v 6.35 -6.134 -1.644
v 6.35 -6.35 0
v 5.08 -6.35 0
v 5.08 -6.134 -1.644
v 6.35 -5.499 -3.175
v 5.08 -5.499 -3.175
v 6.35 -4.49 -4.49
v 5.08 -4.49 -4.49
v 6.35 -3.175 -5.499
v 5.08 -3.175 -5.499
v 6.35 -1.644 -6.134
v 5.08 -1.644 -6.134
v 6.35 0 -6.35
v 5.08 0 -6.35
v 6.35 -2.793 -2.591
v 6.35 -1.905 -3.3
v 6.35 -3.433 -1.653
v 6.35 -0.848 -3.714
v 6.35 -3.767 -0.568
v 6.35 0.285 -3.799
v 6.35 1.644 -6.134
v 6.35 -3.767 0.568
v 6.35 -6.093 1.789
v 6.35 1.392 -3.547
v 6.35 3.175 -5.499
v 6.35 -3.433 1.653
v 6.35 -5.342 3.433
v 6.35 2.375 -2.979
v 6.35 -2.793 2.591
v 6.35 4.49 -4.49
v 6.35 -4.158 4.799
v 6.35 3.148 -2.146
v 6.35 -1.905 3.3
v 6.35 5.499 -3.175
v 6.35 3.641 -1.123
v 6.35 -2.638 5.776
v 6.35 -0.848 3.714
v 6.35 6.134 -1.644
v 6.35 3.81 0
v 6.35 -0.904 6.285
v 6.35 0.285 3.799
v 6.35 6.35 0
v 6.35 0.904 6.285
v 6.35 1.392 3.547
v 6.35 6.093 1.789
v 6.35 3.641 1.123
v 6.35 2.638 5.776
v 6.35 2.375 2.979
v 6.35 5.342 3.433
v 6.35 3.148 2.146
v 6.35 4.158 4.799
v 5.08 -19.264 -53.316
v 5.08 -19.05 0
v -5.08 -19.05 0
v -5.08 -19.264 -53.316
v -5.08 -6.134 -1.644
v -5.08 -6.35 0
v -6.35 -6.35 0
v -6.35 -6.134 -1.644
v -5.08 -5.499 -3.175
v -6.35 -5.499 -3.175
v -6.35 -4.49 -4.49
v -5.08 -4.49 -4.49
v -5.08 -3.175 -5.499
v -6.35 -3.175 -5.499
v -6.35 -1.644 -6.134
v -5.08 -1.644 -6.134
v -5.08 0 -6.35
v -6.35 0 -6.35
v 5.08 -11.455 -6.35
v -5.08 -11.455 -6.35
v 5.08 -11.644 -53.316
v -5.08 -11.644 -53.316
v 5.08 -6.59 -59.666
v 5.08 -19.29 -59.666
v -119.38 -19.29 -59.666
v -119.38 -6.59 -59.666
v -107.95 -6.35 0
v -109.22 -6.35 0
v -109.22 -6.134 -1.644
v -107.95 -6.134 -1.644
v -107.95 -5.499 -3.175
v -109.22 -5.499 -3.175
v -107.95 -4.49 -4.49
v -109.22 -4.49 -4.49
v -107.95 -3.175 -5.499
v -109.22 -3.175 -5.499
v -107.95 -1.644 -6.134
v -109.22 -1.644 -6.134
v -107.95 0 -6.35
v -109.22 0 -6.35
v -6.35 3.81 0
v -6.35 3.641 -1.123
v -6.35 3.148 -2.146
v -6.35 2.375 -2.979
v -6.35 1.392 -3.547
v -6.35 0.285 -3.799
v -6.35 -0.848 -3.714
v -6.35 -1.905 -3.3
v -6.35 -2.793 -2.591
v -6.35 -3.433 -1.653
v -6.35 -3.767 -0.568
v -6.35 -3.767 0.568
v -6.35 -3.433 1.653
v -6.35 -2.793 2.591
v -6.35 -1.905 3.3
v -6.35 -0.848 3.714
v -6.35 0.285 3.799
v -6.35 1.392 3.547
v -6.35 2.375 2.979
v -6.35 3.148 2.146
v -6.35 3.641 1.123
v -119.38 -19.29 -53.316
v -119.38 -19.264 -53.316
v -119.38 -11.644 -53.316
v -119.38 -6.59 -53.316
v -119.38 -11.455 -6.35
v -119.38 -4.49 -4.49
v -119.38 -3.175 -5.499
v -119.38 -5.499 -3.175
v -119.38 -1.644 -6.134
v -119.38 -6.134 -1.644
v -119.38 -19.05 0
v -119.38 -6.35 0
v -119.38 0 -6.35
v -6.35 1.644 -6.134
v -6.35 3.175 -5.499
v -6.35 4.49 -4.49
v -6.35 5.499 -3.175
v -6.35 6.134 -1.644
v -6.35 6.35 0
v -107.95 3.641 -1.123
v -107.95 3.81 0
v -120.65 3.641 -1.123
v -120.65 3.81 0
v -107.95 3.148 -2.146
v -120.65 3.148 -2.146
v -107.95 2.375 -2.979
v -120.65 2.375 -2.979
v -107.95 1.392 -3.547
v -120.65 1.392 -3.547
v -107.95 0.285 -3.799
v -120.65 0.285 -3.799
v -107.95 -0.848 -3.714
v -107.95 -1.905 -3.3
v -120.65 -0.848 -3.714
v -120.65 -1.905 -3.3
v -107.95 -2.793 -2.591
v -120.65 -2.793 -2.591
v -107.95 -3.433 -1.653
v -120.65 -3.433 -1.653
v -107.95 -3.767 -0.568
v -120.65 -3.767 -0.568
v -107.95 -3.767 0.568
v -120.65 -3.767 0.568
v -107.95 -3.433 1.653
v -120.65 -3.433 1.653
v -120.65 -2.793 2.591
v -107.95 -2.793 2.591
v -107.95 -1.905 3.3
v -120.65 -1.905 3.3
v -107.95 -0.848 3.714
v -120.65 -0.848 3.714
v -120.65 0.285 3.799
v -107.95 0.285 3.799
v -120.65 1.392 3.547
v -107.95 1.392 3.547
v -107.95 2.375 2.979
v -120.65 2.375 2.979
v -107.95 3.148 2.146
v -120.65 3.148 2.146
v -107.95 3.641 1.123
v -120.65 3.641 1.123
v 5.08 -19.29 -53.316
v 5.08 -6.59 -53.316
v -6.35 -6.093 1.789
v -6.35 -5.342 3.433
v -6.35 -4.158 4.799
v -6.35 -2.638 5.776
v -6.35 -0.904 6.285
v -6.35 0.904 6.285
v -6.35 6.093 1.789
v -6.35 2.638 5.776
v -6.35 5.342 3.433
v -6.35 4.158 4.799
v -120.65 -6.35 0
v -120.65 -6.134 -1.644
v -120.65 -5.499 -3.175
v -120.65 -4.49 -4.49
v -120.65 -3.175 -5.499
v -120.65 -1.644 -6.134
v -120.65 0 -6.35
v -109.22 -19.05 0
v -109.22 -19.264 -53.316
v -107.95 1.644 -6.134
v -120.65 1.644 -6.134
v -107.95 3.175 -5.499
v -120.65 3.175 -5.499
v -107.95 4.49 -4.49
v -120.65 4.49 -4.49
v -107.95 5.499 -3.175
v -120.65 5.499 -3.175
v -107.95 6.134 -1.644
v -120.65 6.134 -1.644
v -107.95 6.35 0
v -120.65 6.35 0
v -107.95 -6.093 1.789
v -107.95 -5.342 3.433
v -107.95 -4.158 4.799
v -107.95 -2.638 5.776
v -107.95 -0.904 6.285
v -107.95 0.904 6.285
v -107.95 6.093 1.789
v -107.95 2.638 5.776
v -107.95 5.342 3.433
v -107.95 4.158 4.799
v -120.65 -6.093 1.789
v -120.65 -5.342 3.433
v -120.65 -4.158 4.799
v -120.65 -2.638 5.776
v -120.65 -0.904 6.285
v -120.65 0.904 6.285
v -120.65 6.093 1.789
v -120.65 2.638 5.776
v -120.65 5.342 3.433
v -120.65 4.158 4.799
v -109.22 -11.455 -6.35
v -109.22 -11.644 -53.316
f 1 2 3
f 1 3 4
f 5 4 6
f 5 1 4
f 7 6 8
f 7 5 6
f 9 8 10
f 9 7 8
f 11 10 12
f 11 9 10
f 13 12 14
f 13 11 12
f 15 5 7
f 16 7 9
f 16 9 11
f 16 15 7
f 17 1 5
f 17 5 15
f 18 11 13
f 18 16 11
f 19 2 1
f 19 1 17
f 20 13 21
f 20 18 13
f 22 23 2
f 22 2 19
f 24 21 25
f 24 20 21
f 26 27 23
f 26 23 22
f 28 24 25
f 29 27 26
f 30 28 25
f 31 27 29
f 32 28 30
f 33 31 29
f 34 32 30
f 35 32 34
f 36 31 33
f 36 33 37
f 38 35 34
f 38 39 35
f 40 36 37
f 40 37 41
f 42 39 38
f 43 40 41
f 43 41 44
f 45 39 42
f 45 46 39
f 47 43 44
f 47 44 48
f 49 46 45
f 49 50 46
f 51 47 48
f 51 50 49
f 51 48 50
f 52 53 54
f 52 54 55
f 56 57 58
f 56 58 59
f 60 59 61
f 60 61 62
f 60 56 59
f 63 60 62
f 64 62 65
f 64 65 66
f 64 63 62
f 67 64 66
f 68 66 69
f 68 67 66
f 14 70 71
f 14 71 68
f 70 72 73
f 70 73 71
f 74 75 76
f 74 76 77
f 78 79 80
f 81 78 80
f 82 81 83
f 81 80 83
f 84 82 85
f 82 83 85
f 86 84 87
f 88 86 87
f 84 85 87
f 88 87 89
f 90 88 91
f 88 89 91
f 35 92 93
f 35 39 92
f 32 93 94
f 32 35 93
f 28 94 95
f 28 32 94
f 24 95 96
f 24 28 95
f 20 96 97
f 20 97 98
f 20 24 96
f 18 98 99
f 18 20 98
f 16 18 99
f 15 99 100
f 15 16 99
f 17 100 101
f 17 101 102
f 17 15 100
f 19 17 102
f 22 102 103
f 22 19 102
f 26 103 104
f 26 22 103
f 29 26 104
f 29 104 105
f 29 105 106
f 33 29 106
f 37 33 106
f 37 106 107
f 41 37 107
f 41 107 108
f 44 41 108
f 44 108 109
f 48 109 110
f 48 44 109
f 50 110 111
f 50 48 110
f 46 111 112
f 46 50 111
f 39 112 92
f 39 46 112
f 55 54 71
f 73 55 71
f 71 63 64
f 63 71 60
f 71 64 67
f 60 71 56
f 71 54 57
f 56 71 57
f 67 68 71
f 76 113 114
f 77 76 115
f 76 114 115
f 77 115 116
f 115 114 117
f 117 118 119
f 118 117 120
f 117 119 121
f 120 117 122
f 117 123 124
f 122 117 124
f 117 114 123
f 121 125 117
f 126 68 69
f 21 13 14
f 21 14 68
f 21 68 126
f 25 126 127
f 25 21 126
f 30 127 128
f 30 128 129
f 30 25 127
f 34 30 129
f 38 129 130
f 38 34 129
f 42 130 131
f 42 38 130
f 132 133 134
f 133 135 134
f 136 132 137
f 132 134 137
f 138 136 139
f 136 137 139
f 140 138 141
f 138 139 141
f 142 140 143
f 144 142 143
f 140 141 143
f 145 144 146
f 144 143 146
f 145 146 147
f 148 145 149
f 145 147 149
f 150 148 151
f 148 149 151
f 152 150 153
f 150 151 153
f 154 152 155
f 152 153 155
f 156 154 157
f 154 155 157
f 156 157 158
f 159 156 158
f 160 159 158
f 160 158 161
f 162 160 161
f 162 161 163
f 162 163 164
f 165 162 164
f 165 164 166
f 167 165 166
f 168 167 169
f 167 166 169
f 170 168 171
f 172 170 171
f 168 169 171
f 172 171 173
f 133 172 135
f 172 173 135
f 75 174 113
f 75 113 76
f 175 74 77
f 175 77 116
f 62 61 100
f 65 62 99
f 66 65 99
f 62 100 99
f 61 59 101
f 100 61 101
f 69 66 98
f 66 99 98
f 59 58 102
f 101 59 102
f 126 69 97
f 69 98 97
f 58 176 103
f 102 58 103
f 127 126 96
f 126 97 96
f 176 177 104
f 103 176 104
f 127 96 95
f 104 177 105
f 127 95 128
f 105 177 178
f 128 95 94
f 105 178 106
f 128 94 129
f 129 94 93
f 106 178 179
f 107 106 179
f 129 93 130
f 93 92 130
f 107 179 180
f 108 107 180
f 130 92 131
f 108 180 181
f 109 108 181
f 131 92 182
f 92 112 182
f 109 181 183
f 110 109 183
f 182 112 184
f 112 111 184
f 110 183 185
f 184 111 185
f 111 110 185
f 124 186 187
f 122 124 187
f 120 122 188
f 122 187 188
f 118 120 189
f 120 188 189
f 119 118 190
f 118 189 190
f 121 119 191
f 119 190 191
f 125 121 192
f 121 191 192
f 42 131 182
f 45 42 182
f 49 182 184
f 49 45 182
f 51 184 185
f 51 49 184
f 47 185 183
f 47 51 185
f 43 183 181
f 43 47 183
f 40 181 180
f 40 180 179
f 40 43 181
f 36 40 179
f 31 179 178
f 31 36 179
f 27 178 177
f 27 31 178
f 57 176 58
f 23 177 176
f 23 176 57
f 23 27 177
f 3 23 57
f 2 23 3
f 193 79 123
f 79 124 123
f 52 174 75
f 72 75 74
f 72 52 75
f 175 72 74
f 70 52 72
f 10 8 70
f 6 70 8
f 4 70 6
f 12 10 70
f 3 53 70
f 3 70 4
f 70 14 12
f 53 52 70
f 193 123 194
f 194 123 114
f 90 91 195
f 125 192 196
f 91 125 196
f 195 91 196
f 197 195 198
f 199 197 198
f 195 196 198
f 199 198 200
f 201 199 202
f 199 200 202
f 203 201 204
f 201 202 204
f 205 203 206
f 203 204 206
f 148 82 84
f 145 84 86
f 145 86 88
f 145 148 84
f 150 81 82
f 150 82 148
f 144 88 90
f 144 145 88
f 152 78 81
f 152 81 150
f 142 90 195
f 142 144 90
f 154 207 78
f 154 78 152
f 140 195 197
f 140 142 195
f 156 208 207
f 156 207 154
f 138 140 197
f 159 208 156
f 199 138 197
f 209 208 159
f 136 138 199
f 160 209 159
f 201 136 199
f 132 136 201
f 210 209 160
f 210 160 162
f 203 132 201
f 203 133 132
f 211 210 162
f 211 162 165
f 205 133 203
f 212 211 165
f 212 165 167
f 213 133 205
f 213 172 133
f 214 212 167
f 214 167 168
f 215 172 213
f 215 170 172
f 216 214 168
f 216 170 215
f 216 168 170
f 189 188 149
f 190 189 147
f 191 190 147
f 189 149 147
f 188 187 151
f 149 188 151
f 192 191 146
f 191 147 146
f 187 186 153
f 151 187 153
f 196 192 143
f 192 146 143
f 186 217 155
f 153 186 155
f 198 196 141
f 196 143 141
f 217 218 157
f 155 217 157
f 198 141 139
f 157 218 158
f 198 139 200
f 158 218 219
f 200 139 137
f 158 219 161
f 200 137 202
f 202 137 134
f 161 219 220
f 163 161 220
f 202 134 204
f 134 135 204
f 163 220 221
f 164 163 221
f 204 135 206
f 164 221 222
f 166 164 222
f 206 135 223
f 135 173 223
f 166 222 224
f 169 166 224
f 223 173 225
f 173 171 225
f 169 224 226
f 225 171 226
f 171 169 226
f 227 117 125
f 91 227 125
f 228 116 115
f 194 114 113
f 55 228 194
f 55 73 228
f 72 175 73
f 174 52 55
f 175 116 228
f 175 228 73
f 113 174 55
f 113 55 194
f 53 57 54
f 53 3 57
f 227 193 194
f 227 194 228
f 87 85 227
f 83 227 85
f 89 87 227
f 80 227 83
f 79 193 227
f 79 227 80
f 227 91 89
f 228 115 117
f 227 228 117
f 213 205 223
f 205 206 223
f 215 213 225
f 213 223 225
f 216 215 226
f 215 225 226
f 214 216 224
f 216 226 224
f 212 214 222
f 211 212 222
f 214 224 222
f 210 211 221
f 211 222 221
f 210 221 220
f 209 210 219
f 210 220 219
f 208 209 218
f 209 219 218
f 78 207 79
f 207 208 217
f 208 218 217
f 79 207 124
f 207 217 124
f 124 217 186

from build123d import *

# Parameters (mm, degrees)
F1_DEPTH      = 6.35
F1_DEPTH_BACK = 6.35
F2_DEPTH      = 5.08
F2_DEPTH_BACK = 5.08
F6_DEPTH      = 120.14245


with BuildPart() as f1:
    # F0 (on Right) → F1 (new body, two sides)
    with BuildSketch(Plane.YZ) as f1_sk:
        with BuildLine():
            ThreePointArc((6.35, 0), (0, 6.35), (-6.35, 0))
            ThreePointArc((-6.35, 0), (-4.490128, -4.490128), (0, -6.35))
            ThreePointArc((0, -6.35), (4.490128, -4.490128), (6.35, 0))
        make_face()
        with BuildLine():
            ThreePointArc((-3.81, 0), (0, 3.81), (3.81, 0))
            ThreePointArc((3.81, 0), (0, -3.81), (-3.81, 0))
        make_face(mode=Mode.SUBTRACT)
    extrude(amount=F1_DEPTH)
    extrude(f1_sk.sketch, amount=-F1_DEPTH_BACK)

    # F0 (on Right) → F2 (join, two sides)
    with BuildSketch(Plane.YZ) as f2_sk:
        with BuildLine():
            ThreePointArc((0, -6.35), (-4.490128, -4.490128), (-6.35, 0))
            Line((-6.35, 0), (-19.05, 0))
            Line((-19.05, 0), (-19.264068, -53.31585))
            Line((-19.264068, -53.31585), (-11.644068, -53.31585))
            Line((-11.644068, -53.31585), (-11.455496, -6.35))
            Line((-11.455496, -6.35), (0, -6.35))
        make_face()
        Polygon((-19.289564, -59.66585), (-19.264068, -53.31585), (-19.289564, -53.31585), align=None)
        Polygon((-11.644068, -53.31585), (-19.264068, -53.31585), (-19.289564, -59.66585), (-11.669564, -59.66585), align=None)
        Polygon((-6.589564, -53.31585), (-11.644068, -53.31585), (-11.669564, -59.66585), (-6.589564, -59.66585), align=None)
    extrude(amount=F2_DEPTH)
    extrude(f2_sk.sketch, amount=-F2_DEPTH_BACK)



with BuildPart() as f4_1:
    # F4: instance of F1
    add(f1.part.mirror(Plane.YZ.offset(-57.15)))


with BuildPart() as f1_1:
    add(f1.part)

    add(f4_1.part)  # F6 merges F4_1
    # F5 (on face) → F6 (join)
    with BuildSketch(Plane.YZ.offset(5.08)):
        Polygon((-11.644068, -53.31585), (-19.264068, -53.31585), (-19.289564, -53.31585), (-19.289564, -59.66585), (-6.589564, -59.66585), (-6.589564, -53.31585), align=None)
    extrude(amount=-F6_DEPTH)


solid = f1_1.part
